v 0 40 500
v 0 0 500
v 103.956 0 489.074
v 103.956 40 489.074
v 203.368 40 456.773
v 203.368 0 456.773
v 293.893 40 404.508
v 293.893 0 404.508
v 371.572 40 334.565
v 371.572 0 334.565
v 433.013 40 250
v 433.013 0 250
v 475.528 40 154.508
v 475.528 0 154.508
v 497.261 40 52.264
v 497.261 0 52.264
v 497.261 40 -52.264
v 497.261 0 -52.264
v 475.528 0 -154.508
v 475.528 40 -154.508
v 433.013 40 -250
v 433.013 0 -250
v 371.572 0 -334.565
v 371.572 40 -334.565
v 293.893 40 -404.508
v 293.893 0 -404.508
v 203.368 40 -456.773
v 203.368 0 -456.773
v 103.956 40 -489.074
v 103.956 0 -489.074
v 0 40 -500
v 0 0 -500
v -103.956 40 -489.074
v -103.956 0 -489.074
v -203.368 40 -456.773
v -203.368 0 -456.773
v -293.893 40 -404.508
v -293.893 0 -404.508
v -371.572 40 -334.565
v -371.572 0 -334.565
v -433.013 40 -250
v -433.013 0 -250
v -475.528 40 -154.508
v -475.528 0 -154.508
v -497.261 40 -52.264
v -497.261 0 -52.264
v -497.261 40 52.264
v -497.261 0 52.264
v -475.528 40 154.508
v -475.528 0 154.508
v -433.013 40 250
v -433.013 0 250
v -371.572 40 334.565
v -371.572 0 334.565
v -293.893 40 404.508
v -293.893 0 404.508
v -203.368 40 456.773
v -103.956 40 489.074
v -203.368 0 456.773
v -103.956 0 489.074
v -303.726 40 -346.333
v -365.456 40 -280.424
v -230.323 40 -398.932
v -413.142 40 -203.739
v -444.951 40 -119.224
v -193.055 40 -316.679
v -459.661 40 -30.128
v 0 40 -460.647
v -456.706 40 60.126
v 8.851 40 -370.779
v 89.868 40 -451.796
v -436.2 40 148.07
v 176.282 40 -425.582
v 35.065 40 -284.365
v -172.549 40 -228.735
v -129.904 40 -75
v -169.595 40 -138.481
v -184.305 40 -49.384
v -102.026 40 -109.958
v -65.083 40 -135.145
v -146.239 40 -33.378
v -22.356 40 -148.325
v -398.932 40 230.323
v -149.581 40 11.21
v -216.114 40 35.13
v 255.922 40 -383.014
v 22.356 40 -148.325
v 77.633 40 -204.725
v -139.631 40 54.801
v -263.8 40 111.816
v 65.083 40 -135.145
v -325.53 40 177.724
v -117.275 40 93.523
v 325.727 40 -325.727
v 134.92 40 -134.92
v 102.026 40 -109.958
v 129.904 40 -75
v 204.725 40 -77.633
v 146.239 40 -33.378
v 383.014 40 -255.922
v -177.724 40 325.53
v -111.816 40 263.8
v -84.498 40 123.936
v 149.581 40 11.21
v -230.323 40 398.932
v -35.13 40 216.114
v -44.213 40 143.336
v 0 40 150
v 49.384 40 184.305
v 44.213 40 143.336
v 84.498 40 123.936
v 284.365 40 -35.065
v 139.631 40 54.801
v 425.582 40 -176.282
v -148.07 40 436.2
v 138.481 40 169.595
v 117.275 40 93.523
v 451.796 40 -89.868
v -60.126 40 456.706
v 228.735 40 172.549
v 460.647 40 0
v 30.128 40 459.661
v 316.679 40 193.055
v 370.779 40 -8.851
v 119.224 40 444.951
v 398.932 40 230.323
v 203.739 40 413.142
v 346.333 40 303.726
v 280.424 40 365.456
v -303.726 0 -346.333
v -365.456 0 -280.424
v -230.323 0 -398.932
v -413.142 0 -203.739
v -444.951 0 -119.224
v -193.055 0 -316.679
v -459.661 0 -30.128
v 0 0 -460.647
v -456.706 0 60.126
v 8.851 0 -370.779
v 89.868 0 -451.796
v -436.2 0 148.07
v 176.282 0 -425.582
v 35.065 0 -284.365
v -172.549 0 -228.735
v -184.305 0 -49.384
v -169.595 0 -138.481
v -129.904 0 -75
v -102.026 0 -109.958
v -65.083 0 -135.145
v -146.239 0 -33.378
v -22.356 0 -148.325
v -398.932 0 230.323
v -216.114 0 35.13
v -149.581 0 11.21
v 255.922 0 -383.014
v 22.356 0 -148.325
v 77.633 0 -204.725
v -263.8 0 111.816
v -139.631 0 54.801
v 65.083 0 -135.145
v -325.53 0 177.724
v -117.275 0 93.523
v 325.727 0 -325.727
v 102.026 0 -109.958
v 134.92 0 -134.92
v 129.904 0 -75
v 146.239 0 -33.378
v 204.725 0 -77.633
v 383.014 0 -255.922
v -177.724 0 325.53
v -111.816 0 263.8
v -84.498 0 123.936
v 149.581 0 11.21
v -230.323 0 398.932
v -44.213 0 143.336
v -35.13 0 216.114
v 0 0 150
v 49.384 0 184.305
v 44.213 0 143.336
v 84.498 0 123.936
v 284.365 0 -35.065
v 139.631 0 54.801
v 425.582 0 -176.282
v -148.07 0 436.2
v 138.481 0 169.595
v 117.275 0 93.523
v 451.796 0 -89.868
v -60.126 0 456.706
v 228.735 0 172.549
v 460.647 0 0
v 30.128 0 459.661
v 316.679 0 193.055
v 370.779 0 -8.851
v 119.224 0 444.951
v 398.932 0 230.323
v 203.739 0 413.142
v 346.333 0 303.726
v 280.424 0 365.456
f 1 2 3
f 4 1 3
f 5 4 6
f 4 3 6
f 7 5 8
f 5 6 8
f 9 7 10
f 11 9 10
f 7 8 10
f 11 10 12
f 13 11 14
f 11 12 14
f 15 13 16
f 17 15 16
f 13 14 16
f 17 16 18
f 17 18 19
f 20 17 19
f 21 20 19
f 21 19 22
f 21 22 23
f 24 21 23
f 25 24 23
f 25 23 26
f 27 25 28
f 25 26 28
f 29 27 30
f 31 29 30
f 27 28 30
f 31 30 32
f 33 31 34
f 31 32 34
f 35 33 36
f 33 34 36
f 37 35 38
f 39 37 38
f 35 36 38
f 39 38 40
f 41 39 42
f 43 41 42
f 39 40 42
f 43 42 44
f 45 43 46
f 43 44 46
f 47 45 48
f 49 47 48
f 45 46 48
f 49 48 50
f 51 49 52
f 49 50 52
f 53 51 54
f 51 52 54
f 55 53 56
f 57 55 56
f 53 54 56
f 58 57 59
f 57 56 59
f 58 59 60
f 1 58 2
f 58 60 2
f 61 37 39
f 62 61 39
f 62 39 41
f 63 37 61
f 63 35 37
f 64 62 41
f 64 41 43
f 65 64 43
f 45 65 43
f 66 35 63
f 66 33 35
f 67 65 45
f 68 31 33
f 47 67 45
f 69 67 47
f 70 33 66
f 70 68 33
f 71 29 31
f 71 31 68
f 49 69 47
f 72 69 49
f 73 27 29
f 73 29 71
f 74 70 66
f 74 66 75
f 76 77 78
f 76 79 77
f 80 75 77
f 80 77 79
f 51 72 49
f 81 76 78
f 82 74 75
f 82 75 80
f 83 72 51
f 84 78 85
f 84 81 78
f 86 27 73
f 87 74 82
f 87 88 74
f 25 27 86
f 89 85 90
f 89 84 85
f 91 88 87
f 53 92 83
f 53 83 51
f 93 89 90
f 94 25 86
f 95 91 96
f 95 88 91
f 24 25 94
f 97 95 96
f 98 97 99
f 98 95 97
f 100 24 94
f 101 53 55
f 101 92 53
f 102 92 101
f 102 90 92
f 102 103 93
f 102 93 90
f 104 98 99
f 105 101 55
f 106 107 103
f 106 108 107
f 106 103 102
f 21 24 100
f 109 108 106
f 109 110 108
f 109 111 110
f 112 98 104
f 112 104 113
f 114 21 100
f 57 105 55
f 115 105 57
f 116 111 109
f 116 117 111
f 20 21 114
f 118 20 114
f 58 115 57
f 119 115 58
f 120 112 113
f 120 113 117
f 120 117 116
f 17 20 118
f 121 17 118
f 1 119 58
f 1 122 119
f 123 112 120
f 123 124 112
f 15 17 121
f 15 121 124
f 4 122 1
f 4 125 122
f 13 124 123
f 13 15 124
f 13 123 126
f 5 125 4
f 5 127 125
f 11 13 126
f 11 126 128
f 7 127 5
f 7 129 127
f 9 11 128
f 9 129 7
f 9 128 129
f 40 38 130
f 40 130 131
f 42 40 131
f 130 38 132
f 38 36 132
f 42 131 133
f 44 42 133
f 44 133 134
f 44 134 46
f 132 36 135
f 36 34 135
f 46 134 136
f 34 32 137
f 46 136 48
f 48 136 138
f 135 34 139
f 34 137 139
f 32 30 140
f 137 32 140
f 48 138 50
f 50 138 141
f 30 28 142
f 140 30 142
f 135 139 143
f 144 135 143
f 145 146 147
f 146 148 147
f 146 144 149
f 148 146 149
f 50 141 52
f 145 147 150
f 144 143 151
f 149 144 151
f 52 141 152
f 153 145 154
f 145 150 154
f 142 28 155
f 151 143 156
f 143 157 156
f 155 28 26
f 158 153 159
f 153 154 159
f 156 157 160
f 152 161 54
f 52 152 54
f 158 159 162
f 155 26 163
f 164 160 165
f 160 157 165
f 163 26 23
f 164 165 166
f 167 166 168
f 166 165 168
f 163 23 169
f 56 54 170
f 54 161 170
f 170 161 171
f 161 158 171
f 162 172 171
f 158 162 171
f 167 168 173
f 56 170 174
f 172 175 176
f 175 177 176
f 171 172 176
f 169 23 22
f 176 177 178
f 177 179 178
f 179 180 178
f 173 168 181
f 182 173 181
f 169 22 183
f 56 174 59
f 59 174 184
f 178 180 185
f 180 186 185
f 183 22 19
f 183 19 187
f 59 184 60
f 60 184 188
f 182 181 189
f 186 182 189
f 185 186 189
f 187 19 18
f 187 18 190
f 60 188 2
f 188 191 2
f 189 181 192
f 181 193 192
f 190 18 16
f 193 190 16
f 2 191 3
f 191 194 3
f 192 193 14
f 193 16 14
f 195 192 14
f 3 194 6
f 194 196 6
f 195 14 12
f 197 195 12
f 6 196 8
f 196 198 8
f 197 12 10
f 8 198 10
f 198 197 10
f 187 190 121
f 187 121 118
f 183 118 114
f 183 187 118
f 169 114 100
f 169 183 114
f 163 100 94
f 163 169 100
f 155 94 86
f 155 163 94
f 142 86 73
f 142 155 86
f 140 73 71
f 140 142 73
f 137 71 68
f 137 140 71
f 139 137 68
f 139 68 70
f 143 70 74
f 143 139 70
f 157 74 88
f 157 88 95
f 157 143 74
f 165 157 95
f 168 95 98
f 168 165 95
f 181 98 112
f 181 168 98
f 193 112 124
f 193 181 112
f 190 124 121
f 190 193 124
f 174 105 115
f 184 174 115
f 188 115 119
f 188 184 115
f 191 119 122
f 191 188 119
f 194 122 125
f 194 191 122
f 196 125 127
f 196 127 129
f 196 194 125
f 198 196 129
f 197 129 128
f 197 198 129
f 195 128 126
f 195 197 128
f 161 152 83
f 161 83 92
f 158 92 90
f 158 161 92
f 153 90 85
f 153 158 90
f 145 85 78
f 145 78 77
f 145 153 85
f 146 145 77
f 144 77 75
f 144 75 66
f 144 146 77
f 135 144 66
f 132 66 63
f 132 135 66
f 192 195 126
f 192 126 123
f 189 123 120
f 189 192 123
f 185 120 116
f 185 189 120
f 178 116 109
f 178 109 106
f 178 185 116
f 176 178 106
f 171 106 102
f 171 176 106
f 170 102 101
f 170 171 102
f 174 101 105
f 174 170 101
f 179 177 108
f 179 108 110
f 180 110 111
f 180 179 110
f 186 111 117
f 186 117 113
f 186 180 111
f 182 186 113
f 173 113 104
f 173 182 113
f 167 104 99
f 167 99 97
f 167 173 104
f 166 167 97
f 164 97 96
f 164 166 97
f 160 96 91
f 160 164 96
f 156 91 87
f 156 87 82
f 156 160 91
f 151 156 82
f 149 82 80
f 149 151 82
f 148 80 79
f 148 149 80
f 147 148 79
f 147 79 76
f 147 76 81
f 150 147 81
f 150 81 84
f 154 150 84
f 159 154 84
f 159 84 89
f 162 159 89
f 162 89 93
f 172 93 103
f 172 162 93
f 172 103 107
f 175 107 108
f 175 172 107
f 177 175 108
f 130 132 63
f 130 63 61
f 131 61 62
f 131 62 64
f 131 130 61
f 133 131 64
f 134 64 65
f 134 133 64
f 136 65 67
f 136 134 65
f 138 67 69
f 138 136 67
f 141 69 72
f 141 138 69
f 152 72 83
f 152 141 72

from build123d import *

# Parameters (mm, degrees)
CROQUIS1_R              = 500
CROQUIS1_R_2            = 150
SALIENTE_EXTRUIR1_DEPTH = 40


with BuildPart() as part:
    # Croquis1 → Saliente-Extruir1 (new body)
    with BuildSketch(Plane(origin=(0, 0, 0), x_dir=(1, 0, 0), z_dir=(0, 1, 0))):
        with Locations(Location((0, 0, 0), (0, 0, 270))):
            Circle(CROQUIS1_R)
        with Locations(Location((0, 0, 0), (0, 0, 270))):
            Circle(CROQUIS1_R_2, mode=Mode.SUBTRACT)
        with BuildLine():
            ThreePointArc((-398.931865484, -230.323419925), (-184.304605999, 49.384270339), (-230.323419925, 398.931865484))
            ThreePointArc((-230.323419925, 398.931865484), (-444.95067941, 119.22417522), (-398.931865484, -230.323419925))
        make_face(mode=Mode.SUBTRACT)
        with BuildLine():
            ThreePointArc((398.931865484, -230.323419925), (49.384270339, -184.304605999), (-230.323419925, -398.931865484))
            ThreePointArc((-230.323419925, -398.931865484), (119.22417522, -444.95067941), (398.931865484, -230.323419925))
        make_face(mode=Mode.SUBTRACT)
        with BuildLine():
            ThreePointArc((0, 460.646839851), (134.92033566, 134.92033566), (460.646839851, 0))
            ThreePointArc((460.646839851, 0), (325.726504191, 325.726504191), (0, 460.646839851))
        make_face(mode=Mode.SUBTRACT)
    extrude(amount=SALIENTE_EXTRUIR1_DEPTH)


solid = part.part
